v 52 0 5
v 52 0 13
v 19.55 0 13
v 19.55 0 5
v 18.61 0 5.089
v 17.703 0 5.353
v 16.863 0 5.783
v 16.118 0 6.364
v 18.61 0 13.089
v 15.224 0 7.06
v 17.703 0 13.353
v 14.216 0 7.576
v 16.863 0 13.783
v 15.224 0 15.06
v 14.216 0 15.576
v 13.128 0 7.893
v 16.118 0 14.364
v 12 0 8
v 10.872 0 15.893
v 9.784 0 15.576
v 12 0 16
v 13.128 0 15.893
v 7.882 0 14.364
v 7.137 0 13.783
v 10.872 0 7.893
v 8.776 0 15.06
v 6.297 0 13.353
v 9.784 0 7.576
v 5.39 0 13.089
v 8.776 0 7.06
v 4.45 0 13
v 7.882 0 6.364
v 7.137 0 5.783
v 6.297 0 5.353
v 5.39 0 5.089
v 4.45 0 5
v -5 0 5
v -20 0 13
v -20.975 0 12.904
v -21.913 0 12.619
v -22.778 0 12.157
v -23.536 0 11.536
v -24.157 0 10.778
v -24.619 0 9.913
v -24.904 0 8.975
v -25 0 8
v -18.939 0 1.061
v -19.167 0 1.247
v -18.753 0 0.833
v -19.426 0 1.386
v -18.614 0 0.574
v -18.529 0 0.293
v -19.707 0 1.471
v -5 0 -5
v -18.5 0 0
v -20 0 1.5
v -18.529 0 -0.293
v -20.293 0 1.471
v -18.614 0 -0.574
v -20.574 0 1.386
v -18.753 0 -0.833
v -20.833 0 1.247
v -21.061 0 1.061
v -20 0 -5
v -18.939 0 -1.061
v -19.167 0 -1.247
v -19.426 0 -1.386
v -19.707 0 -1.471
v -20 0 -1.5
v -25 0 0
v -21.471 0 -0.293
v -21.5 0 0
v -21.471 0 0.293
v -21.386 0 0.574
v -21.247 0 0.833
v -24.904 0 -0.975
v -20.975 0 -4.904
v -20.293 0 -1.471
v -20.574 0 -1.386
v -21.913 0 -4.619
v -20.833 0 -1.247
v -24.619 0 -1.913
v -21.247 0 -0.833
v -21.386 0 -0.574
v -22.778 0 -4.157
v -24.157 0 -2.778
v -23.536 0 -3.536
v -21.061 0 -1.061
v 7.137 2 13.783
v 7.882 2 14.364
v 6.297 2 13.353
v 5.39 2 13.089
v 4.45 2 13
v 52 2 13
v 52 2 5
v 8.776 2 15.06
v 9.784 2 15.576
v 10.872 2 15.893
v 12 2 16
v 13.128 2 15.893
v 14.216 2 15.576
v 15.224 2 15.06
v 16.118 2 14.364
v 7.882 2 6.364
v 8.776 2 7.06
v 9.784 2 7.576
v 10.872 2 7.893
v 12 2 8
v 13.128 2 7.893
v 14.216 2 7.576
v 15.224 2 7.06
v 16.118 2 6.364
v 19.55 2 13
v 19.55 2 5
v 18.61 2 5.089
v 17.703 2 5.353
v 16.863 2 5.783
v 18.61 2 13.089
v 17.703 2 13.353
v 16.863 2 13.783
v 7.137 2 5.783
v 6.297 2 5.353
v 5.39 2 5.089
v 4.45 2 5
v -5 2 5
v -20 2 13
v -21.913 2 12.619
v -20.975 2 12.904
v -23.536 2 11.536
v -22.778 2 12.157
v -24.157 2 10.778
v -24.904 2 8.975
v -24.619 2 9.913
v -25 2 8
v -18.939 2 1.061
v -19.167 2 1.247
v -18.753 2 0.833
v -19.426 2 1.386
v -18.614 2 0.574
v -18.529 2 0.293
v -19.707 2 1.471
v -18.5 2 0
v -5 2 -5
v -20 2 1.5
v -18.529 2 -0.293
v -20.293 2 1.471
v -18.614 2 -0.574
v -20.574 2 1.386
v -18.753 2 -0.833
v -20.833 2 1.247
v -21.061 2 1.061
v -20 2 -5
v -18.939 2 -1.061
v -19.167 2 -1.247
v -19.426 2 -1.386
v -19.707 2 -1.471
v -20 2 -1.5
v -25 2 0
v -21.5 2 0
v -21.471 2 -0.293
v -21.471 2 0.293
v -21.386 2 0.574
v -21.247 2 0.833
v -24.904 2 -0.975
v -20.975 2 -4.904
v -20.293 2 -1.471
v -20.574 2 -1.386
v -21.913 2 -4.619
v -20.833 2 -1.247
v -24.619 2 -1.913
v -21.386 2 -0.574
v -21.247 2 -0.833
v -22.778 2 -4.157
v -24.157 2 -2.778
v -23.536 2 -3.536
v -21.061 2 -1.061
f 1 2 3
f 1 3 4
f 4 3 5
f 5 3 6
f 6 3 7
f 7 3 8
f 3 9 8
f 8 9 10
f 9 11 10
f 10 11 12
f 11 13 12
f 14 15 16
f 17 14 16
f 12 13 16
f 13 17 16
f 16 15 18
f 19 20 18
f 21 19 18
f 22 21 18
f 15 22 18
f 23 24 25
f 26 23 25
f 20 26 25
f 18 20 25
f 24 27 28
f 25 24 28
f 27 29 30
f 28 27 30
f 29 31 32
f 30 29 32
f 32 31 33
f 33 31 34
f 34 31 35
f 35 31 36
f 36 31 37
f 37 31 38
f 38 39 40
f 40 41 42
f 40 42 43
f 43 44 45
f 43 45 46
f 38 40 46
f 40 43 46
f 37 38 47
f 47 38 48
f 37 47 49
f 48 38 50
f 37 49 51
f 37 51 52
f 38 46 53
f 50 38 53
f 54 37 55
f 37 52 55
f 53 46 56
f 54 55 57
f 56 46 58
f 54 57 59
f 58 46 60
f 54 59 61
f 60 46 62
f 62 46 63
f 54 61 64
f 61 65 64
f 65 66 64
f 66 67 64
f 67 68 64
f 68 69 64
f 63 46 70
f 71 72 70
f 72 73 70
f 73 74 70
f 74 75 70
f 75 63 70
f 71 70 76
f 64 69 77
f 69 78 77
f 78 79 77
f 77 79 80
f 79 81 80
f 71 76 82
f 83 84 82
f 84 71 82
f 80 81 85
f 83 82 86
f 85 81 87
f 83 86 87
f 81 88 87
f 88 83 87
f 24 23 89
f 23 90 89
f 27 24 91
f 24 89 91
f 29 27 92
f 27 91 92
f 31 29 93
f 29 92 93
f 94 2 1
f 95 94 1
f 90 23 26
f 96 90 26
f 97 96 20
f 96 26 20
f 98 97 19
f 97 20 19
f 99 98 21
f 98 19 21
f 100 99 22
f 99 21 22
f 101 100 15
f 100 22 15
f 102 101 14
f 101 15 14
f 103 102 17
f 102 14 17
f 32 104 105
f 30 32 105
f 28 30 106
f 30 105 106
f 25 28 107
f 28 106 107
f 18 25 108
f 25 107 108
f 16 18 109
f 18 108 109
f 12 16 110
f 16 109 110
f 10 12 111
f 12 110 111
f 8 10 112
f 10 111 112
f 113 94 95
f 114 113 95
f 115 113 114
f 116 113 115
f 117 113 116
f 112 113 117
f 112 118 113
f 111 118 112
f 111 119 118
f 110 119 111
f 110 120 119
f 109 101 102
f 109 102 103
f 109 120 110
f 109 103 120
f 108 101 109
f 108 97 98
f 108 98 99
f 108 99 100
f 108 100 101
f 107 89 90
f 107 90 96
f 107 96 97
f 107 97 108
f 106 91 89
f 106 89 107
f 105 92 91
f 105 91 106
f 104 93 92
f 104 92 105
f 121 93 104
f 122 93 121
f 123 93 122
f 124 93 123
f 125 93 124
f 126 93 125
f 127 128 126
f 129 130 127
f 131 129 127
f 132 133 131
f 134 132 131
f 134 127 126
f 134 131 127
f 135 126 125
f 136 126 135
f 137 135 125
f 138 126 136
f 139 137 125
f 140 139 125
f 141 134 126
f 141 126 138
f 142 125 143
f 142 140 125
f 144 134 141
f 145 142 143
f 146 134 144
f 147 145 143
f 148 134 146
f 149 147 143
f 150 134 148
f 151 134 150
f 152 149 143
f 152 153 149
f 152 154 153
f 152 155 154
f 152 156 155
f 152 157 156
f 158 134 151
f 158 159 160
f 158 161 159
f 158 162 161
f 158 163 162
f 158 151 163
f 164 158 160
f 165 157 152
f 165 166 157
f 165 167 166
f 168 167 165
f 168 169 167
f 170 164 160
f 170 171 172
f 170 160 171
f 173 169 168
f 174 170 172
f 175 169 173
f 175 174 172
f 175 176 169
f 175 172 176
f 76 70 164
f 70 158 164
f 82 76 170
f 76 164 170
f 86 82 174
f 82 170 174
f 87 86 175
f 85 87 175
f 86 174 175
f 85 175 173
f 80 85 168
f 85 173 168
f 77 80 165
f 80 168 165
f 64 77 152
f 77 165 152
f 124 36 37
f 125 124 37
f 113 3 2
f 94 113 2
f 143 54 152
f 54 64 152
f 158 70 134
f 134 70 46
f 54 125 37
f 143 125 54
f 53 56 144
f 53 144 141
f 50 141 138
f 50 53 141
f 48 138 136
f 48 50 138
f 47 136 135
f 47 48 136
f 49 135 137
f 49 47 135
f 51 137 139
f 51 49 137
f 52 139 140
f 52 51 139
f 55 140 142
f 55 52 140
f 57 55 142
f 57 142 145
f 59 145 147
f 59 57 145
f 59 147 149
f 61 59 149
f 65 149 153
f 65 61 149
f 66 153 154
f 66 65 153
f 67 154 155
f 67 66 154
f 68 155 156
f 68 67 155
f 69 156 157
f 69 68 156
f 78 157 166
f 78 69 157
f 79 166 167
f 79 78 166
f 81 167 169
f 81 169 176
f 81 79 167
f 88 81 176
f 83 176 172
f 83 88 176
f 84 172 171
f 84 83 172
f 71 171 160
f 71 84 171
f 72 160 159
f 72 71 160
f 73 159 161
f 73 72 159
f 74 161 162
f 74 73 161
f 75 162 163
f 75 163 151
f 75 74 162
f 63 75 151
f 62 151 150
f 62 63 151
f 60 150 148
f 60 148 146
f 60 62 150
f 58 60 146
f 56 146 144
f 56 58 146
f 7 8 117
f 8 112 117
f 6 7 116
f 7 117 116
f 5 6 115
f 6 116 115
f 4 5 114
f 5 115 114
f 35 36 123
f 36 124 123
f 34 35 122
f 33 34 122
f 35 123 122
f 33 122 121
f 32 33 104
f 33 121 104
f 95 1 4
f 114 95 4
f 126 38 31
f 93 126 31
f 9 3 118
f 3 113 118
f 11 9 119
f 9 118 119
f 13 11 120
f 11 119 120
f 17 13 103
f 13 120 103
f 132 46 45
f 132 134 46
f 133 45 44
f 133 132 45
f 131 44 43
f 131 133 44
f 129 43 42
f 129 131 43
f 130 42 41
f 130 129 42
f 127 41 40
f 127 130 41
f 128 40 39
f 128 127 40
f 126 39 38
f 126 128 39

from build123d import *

# Parameters (mm, degrees)
SKETCH_1_R          = 1.5
EXTRUDE_1_DEPTH     = 2
FILLET_2_R          = 5
FILLET_3_R          = 5
SKETCH_7_R          = 6
CUT_EXTRUDE_4_DEPTH = 10
FILLET_5_R          = 5
SKETCH_10_W         = 10
SKETCH_10_H         = 2
EXTRUDE_4_DEPTH     = 10


with BuildPart() as part:
    # 草图1 → 凸台-拉伸1 (new body)
    with BuildSketch(Plane(origin=(0, 0, 0), x_dir=(1, 0, 0), z_dir=(0, 1, 0))):
        with BuildLine():
            Line((17.196152423, -13), (52, -13))
            Line((52, -13), (52, -5))
            Line((52, -5), (-15, -5))
            Line((-15, -5), (-15, 5))
            Line((-15, 5), (-25, 5))
            Line((-25, 5), (-25, -13))
            Line((-25, -13), (6.803847577, -13))
            ThreePointArc((6.803847577, -13), (12, -16), (17.196152423, -13))
        make_face()
        with Locations(Location((-20, 0, 0), (0, 0, 270))):
            Circle(SKETCH_1_R, mode=Mode.SUBTRACT)
    extrude(amount=EXTRUDE_1_DEPTH)

    # 圆角2
    fillet_2_edges = [part.edges().sort_by_distance(p)[0] for p in [
        (-25, 1, -5),
    ]]
    fillet(fillet_2_edges, radius=FILLET_2_R)

    # 圆角3
    fillet_3_edges = [part.edges().sort_by_distance(p)[0] for p in [
        (-25, 1, 13),
    ]]
    fillet(fillet_3_edges, radius=FILLET_3_R)

    # 草图7 → 切除-拉伸4 (cut)
    with BuildSketch(Plane(origin=(0, 2, 0), x_dir=(1, 0, 0), z_dir=(0, 1, 0))):
        with Locations((12, -2)):
            Circle(SKETCH_7_R)
    extrude(amount=-CUT_EXTRUDE_4_DEPTH, mode=Mode.SUBTRACT)

    # 圆角5
    fillet_5_edges = [part.edges().sort_by_distance(p)[0] for p in [
        (17.196152423, 1, 13),
        (6.803847577, 1, 13),
        (6.803847577, 1, 5),
        (17.196152423, 1, 5),
    ]]
    fillet(fillet_5_edges, radius=FILLET_5_R)

    # 草图10 → 凸台-拉伸4 (add)
    with BuildSketch(Plane(origin=(-15, 0, 0), x_dir=(0, 0, -1), z_dir=(1, 0, 0))):
        with Locations((0, 1)):
            Rectangle(SKETCH_10_W, SKETCH_10_H)
    extrude(amount=EXTRUDE_4_DEPTH)


solid = part.part
